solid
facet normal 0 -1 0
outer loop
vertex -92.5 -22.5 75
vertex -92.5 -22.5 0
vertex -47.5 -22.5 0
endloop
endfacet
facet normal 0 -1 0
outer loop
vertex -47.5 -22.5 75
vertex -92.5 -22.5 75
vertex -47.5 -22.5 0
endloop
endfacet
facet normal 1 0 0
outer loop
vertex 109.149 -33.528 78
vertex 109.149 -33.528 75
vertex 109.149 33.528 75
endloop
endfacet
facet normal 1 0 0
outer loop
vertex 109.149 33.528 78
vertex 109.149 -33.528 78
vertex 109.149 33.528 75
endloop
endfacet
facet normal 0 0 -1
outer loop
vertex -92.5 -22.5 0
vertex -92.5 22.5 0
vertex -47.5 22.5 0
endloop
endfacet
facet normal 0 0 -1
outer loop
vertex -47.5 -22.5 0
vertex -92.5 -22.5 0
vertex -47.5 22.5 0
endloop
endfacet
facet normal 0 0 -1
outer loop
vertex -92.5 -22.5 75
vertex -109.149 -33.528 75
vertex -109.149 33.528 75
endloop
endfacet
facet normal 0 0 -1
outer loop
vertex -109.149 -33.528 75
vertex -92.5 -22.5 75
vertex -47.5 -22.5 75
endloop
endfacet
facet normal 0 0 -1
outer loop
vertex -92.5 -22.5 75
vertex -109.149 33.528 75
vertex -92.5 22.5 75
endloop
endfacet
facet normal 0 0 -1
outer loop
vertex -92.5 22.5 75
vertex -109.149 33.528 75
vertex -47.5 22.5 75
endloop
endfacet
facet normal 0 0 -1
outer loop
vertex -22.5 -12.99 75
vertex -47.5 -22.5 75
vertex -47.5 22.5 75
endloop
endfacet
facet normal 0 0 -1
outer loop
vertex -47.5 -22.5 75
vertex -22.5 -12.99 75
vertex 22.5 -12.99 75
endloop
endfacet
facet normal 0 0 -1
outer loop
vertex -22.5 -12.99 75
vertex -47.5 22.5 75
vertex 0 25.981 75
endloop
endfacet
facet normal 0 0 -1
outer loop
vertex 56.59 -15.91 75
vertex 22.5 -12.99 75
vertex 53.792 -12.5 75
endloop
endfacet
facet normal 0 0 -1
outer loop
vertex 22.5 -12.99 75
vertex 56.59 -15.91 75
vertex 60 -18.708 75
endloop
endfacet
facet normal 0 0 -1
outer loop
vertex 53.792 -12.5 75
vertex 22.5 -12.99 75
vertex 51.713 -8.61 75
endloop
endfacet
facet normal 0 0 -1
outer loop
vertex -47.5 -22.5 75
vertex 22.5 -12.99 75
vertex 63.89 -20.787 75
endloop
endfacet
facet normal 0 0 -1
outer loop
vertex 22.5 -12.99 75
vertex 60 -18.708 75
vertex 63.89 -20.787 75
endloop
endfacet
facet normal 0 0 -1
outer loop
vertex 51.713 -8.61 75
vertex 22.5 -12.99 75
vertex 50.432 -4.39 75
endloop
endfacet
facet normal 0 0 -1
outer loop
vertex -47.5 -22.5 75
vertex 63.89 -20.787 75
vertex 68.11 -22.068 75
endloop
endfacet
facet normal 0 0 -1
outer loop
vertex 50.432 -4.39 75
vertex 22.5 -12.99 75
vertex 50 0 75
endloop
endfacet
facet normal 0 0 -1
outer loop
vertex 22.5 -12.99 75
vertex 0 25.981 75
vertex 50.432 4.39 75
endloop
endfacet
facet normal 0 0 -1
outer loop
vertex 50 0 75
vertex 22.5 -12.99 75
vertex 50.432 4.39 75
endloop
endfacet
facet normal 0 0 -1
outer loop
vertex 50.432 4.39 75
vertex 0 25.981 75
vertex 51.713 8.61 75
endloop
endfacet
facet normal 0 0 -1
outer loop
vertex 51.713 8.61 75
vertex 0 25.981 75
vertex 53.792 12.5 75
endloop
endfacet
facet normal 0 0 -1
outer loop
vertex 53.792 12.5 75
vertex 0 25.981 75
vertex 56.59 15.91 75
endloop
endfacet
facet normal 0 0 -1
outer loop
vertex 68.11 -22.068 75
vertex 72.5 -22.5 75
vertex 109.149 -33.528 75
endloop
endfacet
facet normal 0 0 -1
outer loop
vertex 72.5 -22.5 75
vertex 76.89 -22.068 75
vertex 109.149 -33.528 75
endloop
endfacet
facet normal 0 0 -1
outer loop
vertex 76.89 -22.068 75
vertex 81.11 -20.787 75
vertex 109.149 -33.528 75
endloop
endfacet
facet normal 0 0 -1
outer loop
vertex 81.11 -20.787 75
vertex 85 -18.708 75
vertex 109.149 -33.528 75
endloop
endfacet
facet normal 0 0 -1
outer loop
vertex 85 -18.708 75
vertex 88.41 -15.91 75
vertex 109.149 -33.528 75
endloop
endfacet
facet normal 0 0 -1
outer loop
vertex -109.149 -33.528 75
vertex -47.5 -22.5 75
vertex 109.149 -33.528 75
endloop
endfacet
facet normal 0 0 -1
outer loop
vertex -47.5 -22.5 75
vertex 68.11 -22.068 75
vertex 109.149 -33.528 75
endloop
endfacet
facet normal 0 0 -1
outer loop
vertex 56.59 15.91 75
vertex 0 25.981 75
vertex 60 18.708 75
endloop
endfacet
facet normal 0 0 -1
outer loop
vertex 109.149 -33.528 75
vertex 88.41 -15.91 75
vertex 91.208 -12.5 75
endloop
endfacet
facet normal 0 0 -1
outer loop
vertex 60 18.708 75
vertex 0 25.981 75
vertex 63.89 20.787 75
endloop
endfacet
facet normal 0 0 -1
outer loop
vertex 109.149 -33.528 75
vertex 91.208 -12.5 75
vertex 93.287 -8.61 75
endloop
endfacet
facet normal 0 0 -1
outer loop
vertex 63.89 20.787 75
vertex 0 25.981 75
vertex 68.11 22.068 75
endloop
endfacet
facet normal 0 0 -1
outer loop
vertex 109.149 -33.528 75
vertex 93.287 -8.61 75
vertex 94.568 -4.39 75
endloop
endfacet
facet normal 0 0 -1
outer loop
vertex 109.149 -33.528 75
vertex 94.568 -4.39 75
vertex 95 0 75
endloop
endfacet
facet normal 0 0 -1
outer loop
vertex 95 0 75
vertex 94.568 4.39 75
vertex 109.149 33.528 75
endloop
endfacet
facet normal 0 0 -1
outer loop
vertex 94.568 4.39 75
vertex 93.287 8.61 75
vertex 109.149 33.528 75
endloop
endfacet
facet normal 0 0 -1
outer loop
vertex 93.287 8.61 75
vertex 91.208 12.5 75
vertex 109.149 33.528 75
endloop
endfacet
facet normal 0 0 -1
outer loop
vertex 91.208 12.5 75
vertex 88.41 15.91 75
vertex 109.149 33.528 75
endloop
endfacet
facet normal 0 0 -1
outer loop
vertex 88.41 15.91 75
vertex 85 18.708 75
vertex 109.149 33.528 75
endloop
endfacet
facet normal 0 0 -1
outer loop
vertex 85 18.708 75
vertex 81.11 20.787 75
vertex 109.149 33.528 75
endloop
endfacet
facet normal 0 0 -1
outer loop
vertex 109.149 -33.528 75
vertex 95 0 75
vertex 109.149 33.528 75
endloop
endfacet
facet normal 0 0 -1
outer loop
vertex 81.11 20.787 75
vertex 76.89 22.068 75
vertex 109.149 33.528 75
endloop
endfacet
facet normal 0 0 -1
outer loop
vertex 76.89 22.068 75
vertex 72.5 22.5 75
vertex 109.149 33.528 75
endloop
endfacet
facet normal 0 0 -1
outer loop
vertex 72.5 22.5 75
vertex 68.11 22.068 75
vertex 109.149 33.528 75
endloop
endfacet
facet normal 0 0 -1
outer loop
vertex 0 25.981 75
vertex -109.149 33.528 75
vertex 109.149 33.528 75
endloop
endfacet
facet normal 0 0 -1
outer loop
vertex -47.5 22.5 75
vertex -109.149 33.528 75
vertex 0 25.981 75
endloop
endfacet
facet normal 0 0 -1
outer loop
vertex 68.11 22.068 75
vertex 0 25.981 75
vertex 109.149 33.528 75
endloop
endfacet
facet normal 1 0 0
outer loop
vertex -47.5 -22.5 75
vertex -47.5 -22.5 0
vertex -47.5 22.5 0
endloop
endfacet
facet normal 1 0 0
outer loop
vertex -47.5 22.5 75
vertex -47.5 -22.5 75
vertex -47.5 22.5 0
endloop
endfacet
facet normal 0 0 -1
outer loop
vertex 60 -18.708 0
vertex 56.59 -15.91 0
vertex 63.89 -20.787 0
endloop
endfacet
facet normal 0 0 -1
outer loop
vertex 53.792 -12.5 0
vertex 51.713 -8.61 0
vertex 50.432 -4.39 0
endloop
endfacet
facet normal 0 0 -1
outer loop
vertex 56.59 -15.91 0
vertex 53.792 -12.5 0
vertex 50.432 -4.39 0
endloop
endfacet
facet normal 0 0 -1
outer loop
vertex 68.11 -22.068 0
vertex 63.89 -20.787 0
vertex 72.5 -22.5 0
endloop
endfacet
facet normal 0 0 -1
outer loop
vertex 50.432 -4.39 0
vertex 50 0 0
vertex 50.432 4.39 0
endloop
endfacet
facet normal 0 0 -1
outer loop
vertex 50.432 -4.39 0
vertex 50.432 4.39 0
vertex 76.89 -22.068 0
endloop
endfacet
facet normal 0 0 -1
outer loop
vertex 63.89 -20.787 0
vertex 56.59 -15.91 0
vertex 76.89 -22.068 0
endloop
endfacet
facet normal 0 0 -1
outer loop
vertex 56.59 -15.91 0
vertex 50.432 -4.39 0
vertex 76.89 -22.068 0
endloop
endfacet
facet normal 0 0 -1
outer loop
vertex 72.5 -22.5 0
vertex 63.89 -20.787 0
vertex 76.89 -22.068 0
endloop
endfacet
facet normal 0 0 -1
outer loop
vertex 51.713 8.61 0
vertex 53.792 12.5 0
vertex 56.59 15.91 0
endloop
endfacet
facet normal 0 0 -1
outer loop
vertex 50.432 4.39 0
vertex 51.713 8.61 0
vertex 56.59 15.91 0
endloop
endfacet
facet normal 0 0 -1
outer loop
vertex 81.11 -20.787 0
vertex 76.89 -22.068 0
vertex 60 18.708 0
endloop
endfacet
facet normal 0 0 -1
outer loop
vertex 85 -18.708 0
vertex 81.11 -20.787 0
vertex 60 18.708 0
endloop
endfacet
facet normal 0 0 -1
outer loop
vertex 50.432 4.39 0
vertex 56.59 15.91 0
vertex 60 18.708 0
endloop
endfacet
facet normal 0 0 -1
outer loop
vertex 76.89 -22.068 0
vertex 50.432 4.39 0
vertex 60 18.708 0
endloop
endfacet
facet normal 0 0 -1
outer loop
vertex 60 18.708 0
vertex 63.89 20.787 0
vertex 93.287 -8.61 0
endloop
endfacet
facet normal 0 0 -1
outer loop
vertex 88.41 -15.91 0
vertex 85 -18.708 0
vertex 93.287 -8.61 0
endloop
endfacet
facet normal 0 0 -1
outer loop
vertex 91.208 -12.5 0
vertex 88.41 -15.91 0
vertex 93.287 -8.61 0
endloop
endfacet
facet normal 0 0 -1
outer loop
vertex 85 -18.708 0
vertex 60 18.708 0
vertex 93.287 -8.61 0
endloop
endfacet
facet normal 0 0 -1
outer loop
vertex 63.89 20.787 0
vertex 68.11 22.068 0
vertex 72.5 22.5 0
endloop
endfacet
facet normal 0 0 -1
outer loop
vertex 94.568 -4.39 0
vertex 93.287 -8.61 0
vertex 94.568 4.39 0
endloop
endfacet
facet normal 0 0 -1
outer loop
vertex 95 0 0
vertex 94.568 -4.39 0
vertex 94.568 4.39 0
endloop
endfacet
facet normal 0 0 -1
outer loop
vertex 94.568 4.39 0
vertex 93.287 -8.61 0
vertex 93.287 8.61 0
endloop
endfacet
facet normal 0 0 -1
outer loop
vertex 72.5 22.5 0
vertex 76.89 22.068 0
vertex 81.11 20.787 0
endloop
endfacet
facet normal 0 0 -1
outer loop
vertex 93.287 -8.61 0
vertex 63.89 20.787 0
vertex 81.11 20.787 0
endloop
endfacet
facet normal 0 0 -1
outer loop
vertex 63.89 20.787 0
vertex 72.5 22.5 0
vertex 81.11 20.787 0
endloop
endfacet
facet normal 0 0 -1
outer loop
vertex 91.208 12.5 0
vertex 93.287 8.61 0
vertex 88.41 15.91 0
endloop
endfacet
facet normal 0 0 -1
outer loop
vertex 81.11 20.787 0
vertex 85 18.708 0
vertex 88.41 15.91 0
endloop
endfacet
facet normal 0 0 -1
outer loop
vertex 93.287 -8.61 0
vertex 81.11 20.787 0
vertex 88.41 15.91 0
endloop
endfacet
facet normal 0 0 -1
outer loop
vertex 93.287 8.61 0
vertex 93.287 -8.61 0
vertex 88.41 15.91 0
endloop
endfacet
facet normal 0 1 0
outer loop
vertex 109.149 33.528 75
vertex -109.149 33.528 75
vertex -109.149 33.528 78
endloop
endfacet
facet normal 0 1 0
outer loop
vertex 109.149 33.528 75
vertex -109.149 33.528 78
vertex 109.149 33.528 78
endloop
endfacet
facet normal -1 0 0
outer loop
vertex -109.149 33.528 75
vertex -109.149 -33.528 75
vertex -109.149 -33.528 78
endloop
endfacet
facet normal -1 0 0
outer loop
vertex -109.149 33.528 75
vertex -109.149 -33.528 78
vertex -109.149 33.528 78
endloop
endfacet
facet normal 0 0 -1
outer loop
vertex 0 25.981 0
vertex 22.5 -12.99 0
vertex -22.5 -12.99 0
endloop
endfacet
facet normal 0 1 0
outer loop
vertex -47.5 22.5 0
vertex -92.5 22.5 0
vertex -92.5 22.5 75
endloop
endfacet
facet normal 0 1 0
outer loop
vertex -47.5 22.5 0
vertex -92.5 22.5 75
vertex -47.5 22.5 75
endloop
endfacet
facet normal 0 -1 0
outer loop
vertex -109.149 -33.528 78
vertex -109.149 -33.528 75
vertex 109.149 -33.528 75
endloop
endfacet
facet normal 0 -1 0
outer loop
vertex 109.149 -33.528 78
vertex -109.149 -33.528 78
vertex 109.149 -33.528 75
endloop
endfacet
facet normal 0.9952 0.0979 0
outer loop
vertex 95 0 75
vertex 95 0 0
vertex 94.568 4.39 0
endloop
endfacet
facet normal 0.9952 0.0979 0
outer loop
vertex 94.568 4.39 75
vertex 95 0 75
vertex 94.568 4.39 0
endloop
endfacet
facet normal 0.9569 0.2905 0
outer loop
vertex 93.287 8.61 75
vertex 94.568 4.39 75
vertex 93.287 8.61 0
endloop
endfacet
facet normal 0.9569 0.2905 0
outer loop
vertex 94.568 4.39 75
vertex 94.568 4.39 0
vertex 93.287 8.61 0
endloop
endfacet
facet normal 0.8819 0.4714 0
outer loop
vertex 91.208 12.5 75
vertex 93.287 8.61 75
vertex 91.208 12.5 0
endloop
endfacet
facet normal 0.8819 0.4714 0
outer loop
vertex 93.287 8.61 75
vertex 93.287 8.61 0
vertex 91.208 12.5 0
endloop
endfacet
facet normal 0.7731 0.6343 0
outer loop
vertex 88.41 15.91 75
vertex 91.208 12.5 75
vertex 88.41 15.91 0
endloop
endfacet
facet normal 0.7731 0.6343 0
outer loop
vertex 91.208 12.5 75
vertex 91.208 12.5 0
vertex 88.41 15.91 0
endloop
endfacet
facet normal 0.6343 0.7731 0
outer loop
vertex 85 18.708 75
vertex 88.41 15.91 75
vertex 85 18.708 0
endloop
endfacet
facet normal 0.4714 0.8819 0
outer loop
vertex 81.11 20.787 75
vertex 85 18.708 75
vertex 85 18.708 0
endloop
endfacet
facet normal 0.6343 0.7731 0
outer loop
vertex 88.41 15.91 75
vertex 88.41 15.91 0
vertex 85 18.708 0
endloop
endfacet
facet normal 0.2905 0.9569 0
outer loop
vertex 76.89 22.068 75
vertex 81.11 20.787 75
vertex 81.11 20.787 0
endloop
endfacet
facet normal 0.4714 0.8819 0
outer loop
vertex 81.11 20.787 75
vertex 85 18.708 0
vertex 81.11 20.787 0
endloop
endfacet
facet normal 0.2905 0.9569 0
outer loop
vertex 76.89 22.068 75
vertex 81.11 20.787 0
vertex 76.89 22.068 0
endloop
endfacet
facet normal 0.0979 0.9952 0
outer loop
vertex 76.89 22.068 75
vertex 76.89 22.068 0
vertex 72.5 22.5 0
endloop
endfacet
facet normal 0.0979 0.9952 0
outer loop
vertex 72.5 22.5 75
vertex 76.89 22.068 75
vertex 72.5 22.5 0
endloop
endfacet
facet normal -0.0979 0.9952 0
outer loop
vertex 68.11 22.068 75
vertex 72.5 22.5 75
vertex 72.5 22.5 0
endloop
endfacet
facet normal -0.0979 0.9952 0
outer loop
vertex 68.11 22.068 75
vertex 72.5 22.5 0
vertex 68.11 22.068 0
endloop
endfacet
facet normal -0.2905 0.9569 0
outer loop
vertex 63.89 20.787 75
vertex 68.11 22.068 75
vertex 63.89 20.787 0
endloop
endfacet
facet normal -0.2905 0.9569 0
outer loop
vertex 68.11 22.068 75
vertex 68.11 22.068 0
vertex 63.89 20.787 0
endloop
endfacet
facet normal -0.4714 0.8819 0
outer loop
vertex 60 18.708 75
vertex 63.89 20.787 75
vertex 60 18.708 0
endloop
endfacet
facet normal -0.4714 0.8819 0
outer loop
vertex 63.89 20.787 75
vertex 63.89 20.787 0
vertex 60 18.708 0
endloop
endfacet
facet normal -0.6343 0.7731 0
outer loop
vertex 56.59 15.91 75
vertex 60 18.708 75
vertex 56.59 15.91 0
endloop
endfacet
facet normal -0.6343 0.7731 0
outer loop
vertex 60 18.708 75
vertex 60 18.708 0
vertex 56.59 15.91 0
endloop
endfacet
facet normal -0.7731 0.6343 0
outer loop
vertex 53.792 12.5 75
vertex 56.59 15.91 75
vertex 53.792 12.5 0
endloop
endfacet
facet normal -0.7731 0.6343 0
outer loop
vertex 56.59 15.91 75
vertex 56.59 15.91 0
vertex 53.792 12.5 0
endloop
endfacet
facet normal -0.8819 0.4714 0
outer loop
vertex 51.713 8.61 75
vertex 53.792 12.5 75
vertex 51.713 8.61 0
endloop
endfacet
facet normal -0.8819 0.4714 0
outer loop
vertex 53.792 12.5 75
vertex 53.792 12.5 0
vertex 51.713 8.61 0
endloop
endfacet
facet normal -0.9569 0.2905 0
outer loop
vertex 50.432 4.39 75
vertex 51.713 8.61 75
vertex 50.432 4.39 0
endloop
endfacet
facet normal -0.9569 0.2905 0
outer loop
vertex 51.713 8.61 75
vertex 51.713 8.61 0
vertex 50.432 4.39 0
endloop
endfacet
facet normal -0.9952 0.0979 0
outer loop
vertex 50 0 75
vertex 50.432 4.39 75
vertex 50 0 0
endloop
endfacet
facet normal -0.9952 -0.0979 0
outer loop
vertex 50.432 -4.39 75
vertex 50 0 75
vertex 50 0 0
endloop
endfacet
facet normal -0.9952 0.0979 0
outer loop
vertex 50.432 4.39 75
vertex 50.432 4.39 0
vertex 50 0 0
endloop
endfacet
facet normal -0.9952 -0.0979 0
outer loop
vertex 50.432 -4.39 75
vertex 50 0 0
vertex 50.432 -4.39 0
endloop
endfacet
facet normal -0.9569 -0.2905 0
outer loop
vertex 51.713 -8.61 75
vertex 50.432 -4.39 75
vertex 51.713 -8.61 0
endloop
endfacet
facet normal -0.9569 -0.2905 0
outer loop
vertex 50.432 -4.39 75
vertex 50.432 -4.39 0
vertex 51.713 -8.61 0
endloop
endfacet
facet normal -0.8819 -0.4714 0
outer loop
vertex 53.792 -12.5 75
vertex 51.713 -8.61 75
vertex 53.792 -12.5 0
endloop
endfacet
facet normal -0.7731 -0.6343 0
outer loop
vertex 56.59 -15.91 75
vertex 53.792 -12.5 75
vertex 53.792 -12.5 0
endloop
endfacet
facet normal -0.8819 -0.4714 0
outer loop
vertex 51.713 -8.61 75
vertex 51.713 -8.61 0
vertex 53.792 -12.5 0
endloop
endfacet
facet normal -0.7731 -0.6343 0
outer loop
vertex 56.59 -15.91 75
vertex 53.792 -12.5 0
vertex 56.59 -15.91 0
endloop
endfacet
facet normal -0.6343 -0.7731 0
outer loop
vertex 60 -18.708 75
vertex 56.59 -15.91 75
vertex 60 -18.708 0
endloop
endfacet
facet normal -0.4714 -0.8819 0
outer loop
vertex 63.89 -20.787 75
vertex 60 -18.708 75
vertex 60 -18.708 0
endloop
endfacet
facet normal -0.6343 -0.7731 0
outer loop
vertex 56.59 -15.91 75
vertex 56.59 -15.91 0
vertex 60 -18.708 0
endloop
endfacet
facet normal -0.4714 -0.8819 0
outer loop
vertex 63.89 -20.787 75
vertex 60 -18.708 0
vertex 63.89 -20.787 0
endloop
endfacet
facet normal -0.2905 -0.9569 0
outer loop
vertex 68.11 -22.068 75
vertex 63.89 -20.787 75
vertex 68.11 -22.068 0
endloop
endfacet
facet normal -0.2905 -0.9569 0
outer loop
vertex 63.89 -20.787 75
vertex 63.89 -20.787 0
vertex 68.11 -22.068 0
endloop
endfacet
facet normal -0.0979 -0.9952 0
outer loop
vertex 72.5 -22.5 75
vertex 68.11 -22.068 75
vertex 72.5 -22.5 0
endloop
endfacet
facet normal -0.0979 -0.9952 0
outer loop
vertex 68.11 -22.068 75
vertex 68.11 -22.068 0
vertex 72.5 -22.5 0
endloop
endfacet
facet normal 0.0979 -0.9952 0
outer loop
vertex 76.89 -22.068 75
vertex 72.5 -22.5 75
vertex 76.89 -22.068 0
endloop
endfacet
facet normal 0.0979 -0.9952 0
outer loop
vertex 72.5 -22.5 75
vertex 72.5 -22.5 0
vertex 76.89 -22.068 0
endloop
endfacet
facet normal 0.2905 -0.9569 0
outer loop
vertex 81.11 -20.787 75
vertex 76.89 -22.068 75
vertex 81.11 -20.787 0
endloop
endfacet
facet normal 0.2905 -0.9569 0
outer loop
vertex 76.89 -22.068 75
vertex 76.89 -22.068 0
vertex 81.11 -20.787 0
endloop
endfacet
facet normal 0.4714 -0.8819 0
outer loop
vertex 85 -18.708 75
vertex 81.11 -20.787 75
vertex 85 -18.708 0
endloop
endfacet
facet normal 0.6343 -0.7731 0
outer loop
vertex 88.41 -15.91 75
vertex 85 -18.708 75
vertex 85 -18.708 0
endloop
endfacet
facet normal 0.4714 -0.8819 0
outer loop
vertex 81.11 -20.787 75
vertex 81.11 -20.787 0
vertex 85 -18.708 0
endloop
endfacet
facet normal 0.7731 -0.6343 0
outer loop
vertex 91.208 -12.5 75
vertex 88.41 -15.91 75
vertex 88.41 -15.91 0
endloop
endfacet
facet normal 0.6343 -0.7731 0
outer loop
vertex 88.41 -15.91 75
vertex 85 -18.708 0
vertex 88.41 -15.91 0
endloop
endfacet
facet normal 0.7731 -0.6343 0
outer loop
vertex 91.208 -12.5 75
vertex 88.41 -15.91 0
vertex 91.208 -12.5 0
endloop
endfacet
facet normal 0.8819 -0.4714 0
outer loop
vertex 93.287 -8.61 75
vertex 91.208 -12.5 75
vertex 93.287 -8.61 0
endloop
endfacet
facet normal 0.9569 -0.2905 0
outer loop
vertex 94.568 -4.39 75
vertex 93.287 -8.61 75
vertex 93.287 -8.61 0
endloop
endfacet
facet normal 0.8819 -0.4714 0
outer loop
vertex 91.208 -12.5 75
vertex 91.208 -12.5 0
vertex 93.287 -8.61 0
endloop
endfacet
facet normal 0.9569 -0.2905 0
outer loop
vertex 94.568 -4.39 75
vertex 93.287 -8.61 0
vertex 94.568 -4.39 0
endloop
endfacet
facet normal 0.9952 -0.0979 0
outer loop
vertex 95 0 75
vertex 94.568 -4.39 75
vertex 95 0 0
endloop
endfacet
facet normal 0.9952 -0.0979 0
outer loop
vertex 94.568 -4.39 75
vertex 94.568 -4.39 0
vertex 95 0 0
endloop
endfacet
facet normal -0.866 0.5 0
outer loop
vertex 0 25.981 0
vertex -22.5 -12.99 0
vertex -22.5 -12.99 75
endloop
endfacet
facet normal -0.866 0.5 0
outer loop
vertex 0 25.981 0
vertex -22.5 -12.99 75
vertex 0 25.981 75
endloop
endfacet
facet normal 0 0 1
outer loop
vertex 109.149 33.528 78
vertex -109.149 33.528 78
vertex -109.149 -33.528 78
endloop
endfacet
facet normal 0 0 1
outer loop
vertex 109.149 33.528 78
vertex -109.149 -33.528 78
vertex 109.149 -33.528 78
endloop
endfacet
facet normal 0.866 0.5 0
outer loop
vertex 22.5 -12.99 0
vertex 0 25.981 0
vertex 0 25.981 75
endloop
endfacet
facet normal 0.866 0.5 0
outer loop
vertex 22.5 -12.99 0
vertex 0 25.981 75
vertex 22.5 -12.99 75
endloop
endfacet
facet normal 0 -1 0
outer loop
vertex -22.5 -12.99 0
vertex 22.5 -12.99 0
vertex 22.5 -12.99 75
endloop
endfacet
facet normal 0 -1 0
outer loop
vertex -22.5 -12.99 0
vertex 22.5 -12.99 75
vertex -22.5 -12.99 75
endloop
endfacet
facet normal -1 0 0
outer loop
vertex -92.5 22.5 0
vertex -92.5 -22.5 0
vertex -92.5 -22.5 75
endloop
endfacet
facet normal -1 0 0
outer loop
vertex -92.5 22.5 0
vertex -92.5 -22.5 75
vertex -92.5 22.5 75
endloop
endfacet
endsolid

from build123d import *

# Parameters (mm, degrees)
SKETCH1_R             = 22.5
BOSS_EXTRUDE1_DEPTH   = 75
BOSS_EXTRUDE1_2_DEPTH = 75
SKETCH1_W             = 45
SKETCH1_H             = 45
BOSS_EXTRUDE1_3_DEPTH = 75
SKETCH2_W             = 218.297343906
SKETCH2_H             = 67.055865706
BOSS_EXTRUDE2_DEPTH   = 3


with BuildPart() as part:
    # Sketch1 → Boss-Extrude1 (new body)
    with BuildSketch(Plane.XY):
        with Locations((72.5, 0)):
            Circle(SKETCH1_R)
    extrude(amount=BOSS_EXTRUDE1_DEPTH)



with BuildPart() as body_2:
    # Sketch1 → Boss-Extrude1 2 (new body)
    with BuildSketch(Plane.XY):
        Polygon((-22.5, -12.990381057), (0, 25.980762114), (22.5, -12.990381057), align=None)
    extrude(amount=BOSS_EXTRUDE1_2_DEPTH)


with BuildPart() as body_3:
    # Sketch1 → Boss-Extrude1 3 (new body)
    with BuildSketch(Plane.XY):
        with Locations((-70, 0)):
            Rectangle(SKETCH1_W, SKETCH1_H)
    extrude(amount=BOSS_EXTRUDE1_3_DEPTH)


with BuildPart() as part_1:
    add(part.part)

    add(body_2.part)  # Boss-Extrude2 merges body 2

    add(body_3.part)  # Boss-Extrude2 merges body 3
    # Sketch2 → Boss-Extrude2 (add)
    with BuildSketch(Plane.XY.offset(75)):
        Rectangle(SKETCH2_W, SKETCH2_H)
    extrude(amount=BOSS_EXTRUDE2_DEPTH)


solid = part_1.part
